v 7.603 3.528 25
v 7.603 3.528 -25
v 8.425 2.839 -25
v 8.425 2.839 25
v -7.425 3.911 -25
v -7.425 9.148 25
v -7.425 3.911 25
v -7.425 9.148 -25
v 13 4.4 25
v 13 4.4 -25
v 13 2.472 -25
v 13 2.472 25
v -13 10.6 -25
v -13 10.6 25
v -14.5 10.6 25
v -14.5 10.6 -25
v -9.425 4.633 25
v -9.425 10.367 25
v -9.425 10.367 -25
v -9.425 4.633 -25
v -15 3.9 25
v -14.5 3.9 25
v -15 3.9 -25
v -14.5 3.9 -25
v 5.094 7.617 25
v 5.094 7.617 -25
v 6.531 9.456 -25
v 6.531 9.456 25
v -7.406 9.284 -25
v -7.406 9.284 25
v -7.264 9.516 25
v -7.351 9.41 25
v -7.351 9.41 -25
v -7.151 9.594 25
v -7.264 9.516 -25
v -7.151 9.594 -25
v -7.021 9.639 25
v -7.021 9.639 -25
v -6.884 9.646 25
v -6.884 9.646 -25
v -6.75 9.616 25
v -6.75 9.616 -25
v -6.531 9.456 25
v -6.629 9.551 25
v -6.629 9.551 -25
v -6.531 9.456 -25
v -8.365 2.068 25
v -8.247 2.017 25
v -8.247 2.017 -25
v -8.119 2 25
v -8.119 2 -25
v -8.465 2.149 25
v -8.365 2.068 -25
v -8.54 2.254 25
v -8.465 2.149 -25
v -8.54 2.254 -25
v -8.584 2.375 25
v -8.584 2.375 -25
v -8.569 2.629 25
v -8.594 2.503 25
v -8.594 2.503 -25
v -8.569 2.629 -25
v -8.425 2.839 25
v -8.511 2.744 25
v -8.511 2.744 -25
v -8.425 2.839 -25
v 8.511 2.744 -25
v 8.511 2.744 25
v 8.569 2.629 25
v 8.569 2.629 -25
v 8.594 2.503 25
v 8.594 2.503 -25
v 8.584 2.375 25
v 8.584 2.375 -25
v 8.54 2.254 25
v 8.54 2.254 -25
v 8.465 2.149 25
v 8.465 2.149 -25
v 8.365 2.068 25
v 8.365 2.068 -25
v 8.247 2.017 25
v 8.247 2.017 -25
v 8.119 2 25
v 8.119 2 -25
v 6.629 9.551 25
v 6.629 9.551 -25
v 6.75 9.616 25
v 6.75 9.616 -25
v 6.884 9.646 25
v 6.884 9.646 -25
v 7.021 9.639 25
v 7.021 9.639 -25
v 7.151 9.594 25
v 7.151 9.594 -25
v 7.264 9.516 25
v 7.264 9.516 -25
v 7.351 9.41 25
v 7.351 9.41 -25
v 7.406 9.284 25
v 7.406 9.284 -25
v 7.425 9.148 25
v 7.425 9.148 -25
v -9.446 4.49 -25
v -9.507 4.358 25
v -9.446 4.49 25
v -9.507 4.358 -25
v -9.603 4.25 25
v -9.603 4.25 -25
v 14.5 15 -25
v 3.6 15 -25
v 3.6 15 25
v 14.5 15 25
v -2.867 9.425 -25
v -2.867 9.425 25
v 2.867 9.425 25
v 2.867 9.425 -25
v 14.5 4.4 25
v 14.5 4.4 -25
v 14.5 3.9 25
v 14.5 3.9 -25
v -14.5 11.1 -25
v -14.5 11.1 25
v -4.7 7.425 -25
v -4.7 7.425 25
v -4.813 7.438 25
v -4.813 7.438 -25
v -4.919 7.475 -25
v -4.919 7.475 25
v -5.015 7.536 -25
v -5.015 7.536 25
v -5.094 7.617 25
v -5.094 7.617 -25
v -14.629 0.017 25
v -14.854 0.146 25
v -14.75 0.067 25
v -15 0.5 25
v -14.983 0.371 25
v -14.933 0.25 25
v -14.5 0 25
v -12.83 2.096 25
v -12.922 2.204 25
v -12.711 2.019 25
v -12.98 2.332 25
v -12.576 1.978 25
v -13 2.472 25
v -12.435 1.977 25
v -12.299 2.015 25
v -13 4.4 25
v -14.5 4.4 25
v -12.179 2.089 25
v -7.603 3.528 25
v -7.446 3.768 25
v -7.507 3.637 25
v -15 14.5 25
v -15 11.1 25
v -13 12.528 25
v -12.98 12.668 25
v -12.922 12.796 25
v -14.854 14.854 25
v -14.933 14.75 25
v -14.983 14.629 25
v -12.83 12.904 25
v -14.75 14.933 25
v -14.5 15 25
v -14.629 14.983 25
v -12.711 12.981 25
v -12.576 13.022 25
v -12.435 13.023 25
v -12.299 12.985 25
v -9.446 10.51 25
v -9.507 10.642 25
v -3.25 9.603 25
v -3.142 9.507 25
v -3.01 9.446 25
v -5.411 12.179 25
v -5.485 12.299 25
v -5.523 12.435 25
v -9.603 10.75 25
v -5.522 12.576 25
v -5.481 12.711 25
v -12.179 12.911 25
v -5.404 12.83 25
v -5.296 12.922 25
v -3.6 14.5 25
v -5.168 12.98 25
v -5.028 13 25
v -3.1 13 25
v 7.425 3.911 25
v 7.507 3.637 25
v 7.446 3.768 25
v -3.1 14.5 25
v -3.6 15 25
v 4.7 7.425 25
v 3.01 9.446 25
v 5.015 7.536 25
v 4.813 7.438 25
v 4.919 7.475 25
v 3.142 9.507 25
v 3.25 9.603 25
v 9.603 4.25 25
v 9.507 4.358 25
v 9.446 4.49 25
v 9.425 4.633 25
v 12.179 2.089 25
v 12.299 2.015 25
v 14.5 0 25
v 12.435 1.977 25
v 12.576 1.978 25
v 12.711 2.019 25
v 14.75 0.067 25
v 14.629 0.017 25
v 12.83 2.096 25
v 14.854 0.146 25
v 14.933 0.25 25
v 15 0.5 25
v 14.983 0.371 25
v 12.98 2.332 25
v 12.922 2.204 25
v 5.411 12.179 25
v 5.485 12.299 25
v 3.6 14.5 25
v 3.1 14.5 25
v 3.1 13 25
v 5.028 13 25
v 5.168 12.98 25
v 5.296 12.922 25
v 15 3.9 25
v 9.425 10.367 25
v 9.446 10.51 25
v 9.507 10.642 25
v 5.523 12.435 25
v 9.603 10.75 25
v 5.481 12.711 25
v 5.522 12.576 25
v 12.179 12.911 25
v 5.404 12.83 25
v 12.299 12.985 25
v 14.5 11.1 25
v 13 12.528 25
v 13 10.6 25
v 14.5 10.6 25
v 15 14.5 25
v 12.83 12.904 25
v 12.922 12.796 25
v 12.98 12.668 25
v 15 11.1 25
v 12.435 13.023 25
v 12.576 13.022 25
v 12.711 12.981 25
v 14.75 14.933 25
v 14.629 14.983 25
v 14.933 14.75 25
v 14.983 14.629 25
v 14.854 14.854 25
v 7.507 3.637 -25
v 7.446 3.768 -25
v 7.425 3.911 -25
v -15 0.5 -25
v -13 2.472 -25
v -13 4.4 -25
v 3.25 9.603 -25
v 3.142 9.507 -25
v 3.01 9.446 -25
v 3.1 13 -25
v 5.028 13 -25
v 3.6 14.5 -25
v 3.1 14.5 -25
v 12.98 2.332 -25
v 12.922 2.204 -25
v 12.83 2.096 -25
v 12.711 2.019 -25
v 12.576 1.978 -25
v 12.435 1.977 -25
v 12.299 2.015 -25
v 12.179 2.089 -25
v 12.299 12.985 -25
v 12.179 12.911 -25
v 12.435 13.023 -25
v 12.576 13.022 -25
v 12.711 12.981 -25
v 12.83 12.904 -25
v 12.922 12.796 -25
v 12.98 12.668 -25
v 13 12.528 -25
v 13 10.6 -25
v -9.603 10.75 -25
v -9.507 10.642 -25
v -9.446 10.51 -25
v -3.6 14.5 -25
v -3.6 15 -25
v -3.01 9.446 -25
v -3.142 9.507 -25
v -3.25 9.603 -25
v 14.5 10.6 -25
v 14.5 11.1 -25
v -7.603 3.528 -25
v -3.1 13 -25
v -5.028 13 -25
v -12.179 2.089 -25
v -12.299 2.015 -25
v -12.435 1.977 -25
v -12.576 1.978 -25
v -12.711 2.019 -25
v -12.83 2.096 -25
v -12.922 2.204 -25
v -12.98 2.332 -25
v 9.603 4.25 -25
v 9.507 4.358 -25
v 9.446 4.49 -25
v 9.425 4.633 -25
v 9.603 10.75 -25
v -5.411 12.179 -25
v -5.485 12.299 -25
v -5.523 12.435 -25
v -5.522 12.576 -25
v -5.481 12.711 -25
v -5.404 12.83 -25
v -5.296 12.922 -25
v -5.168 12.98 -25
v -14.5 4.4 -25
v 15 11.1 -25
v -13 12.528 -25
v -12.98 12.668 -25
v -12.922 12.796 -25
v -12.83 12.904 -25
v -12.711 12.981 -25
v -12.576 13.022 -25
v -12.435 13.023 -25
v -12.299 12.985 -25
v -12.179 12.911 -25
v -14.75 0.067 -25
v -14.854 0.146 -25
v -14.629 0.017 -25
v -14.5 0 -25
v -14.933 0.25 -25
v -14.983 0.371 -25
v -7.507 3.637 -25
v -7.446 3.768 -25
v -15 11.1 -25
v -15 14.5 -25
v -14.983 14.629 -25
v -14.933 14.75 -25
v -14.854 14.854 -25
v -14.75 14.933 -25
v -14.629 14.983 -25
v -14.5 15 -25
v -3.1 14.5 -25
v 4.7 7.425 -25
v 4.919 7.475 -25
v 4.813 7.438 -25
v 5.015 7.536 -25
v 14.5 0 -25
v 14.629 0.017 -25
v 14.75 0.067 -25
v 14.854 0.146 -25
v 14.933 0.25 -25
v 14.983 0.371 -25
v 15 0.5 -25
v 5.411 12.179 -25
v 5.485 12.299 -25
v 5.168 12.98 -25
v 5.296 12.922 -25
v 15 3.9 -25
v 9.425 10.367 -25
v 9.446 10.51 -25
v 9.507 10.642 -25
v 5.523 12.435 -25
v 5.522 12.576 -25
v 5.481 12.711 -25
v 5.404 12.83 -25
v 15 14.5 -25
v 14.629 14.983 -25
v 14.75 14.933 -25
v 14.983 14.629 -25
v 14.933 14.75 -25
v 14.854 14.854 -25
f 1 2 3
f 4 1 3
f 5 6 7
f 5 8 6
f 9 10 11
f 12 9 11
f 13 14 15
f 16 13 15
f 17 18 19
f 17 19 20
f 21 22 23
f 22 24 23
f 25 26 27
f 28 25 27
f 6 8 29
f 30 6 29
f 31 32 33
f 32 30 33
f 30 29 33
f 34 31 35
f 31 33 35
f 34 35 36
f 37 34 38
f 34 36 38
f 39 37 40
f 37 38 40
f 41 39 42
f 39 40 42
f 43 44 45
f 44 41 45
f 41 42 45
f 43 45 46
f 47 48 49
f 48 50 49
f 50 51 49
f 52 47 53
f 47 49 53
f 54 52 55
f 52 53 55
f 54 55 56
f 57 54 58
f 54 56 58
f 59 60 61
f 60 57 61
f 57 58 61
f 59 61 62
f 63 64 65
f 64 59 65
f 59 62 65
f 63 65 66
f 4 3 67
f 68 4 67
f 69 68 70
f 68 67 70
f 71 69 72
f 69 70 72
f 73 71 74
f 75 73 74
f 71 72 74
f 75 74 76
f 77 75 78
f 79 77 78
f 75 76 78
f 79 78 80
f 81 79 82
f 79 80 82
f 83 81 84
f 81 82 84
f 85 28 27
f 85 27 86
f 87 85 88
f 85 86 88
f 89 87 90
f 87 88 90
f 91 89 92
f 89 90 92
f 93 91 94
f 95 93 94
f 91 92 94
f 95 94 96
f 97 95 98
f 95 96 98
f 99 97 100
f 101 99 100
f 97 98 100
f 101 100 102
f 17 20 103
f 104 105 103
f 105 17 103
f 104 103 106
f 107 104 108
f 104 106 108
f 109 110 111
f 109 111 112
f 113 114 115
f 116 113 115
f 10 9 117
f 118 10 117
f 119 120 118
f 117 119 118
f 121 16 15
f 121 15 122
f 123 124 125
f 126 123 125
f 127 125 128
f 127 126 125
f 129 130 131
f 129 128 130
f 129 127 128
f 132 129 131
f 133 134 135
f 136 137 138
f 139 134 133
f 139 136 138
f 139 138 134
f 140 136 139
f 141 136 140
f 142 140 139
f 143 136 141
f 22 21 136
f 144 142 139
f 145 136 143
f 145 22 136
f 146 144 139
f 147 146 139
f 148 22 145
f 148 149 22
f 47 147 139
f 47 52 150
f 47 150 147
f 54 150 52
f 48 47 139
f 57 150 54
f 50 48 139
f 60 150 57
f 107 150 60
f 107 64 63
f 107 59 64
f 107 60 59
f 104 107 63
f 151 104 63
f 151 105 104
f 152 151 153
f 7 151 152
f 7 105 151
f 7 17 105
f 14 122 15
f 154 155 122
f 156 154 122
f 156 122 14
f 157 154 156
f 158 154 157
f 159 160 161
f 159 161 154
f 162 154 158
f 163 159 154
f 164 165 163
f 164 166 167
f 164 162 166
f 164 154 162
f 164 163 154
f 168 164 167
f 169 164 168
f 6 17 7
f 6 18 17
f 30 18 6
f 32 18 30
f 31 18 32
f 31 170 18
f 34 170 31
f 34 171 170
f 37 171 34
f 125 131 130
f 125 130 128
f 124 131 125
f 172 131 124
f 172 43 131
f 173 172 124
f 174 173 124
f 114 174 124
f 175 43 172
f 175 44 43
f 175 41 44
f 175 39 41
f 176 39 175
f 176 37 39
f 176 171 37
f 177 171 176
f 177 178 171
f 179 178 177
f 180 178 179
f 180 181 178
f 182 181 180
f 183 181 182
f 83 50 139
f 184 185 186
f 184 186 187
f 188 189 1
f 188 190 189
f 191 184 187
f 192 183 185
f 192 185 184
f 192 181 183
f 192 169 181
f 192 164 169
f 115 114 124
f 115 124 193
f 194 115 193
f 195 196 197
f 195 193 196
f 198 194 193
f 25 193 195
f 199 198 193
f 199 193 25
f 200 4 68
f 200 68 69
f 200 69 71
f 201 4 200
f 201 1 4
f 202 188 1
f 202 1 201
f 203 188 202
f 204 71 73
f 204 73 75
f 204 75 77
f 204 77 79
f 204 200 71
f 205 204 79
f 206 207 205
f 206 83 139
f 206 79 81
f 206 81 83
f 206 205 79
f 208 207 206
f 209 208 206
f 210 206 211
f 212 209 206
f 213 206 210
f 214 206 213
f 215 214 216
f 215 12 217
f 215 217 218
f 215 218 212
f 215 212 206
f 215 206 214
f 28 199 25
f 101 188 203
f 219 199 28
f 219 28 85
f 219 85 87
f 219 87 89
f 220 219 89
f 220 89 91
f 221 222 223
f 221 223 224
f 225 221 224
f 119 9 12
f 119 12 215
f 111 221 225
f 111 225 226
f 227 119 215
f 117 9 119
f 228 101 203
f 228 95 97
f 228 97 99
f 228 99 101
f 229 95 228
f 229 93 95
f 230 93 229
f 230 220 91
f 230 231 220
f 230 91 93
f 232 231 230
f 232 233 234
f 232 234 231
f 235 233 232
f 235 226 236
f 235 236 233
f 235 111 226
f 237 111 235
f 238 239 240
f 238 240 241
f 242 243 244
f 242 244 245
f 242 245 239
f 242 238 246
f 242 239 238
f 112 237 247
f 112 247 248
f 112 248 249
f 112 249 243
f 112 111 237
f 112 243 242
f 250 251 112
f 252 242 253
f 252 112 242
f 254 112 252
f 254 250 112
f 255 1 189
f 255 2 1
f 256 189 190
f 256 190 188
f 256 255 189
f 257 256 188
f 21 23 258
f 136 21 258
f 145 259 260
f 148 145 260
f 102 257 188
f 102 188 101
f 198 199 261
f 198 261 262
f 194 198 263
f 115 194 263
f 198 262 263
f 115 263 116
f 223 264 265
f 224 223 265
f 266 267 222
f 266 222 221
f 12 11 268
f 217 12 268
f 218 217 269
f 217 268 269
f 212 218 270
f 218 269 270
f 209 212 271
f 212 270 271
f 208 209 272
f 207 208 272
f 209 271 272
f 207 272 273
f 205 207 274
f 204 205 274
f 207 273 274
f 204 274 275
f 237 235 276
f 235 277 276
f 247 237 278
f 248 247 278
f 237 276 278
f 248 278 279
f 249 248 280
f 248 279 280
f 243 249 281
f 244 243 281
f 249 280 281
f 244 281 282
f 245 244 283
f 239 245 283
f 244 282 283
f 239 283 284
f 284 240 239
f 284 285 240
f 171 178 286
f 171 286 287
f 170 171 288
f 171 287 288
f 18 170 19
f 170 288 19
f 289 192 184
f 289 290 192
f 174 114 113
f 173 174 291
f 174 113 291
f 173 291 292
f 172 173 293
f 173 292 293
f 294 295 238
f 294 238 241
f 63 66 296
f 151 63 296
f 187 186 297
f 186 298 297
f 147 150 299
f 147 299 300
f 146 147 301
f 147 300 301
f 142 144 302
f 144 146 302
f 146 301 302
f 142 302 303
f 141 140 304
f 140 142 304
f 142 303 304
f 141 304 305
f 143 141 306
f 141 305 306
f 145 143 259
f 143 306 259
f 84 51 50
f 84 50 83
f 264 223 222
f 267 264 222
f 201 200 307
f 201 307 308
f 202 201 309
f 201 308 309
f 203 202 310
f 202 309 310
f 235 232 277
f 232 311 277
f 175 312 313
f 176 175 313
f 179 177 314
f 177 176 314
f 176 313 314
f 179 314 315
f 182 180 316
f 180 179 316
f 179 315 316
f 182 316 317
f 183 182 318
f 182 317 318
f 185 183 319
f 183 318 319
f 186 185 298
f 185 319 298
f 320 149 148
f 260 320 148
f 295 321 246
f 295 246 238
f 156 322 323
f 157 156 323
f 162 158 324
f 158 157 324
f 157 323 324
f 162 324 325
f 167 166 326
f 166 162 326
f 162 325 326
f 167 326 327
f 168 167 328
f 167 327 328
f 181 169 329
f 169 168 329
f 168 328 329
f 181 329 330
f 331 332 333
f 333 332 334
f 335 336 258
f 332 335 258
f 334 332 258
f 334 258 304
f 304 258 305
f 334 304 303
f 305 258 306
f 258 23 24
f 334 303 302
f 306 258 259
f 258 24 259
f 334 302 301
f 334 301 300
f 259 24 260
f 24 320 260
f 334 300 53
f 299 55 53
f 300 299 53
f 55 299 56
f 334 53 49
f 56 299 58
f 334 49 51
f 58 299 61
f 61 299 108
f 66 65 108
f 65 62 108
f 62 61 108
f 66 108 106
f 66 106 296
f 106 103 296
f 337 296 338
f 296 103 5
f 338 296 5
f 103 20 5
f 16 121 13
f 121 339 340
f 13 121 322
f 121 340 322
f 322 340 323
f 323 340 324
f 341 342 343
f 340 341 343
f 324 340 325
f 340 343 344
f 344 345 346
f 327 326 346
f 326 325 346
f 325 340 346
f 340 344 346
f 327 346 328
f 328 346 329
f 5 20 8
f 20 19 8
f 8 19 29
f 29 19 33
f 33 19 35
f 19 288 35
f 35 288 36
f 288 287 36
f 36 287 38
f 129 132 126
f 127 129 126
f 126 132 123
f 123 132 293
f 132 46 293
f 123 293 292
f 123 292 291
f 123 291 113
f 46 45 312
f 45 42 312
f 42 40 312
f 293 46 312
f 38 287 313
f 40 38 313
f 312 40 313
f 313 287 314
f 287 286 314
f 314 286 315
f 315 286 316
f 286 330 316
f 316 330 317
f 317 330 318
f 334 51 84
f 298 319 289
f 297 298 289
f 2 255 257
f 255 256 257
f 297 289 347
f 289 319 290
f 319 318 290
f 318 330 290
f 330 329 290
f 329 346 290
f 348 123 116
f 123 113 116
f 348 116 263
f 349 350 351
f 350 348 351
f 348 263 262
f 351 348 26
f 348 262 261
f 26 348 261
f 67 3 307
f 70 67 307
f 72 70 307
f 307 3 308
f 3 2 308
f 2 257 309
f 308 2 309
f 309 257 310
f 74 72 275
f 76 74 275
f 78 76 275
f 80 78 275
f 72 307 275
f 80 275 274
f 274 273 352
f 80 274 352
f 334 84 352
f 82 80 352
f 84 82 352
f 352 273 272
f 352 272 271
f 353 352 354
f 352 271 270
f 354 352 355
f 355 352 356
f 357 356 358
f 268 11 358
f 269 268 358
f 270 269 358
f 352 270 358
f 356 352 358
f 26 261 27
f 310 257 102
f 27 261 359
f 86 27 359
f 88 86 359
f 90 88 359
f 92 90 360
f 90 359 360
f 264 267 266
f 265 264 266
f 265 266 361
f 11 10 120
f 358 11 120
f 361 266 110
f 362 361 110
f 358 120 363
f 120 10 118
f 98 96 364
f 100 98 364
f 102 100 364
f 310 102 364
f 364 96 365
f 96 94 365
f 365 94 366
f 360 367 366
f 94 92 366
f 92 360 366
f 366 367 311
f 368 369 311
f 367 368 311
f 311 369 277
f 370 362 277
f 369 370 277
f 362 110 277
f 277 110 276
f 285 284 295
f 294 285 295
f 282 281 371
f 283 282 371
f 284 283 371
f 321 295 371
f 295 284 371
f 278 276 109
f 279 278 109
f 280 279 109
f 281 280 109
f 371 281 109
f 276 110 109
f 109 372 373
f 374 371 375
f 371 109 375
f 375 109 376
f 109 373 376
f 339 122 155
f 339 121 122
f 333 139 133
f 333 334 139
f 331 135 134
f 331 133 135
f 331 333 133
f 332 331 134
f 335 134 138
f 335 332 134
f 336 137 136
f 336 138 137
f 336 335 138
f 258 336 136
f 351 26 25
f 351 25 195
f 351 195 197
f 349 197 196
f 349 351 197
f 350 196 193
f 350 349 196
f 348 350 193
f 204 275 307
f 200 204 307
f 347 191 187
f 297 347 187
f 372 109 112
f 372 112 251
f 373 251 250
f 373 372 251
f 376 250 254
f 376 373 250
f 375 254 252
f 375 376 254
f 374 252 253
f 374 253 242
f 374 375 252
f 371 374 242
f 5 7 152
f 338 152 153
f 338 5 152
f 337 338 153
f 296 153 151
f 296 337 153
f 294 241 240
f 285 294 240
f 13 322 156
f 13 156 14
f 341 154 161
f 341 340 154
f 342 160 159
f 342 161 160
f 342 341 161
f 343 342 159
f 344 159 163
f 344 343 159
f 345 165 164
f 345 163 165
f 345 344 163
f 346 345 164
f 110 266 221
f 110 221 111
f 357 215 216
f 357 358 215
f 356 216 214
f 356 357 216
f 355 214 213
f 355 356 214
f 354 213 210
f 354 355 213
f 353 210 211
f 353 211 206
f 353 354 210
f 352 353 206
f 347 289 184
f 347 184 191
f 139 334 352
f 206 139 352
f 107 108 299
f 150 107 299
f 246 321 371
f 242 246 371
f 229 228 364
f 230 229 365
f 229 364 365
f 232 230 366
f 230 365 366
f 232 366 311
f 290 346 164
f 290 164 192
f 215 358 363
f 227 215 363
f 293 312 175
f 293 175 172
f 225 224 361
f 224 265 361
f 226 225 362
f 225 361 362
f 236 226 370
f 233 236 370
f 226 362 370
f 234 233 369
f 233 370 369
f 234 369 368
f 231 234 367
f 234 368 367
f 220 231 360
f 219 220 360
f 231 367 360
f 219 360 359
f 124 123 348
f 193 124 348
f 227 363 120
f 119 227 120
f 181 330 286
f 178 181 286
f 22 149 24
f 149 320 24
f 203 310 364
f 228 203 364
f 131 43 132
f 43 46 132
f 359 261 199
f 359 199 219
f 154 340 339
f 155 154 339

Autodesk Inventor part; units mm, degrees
ref_plane "YZ Plane" through (0, 0, 0) normal (1, 0, 0) x (0, 1, 0)
ref_plane "XZ Plane" through (0, 0, 0) normal (0, 1, 0) x (-1, 0, 0)
ref_plane "XY Plane" through (0, 0, 0) normal (0, 0, 1) x (1, 0, 0)
sketch "Esboço1" plane through (0, 0, 0) normal (0, 0, 1) x (1, 0, 0)
  line L0 (-15, 15) -> (15, 15) construction
  line L1 (-15, 15) -> (-15, 10.6) construction
  line L2 (-15, 10.6) -> (-13, 10.6) construction
  line L3 (-13, 13.6) -> (-13, 10.6) construction
  line L4 (-13, 13.6) -> (-9.4247, 10.6) construction
  line L5 (-9.4247, 10.6) -> (-9.4247, 4.4) construction
  line L6 (-9.4247, 4.4) -> (-13, 1.4) construction
  line L7 (-13, 4.4) -> (-13, 1.4) construction
  line L8 (-15, 4.4) -> (-13, 4.4) construction
  line L9 (-15, 4.4) -> (-15, 0) construction
  line L10 (-15, 0) -> (0, 0) construction
  line L11 (-15, 4.4) -> (-14.5, 4.4) construction
  line L12 (-14.5, 4.4) -> (-14.5, 3.9)
  line L13 (-14.5, 3.9) -> (-15, 3.9)
  line L14 (-15, 3.9) -> (-15, 4.4) construction
  line L15 (-15, 10.6) -> (-14.5, 10.6) construction
  line L16 (-14.5, 10.6) -> (-14.5, 11.1)
  line L17 (-14.5, 11.1) -> (-15, 11.1)
  line L18 (-15, 11.1) -> (-15, 10.6) construction
  line L19 (-3.1, 9.4247) -> (3.1, 9.4247) construction
  line L20 (-6.1, 13) -> (-3.1, 9.4247) construction
  line L21 (-6.1, 13) -> (-3.1, 13) construction
  line L22 (-3.1, 15) -> (-3.1, 13) construction
  line L23 (-3.1, 9.4247) -> (0, 9.4247) construction
  line L24 (-3.1, 15) -> (-3.6, 15) construction
  line L25 (-3.6, 15) -> (-3.6, 14.5)
  line L26 (-3.6, 14.5) -> (-3.1, 14.5)
  line L27 (-3.1, 14.5) -> (-3.1, 15) construction
  line L28 (-9.4247, 2) -> (0, 2) construction
  line L29 (-7.4247, 3.6782) -> (-9.4247, 2) construction
  line L30 (-7.4247, 10.6) -> (-7.4247, 3.6782) construction
  line L31 (-7.4247, 10.6) -> (-4.944, 7.4247) construction
  line L32 (-4.944, 7.4247) -> (0, 7.4247) construction
  arc A0 (-14.5, 15) -> (-15, 14.5) centre (-14.5, 14.5) ccw
  arc A1 (-12.1786, 12.9108) -> (-13, 12.5277) centre (-12.5, 12.5277) ccw
  line L33 (-13, 12.5277) -> (-13, 10.6)
  line L34 (-13, 10.6) -> (-14.5, 10.6)
  arc A2 (-9.4247, 10.3668) -> (-9.6033, 10.7499) centre (-9.9247, 10.3668) ccw
  arc A3 (-9.6033, 4.2501) -> (-9.4247, 4.6332) centre (-9.9247, 4.6332) ccw
  arc A4 (-13, 2.4723) -> (-12.1786, 2.0892) centre (-12.5, 2.4723) ccw
  line L35 (-9.6033, 4.2501) -> (-12.1786, 2.0892)
  line L36 (-13, 2.4723) -> (-13, 4.4)
  arc A5 (-15, 0.5) -> (-14.5, 0) centre (-14.5, 0.5) ccw
  line L37 (-15, 14.5) -> (-15, 11.1)
  line L38 (-15, 3.9) -> (-15, 0.5)
  arc A6 (-8.4247, 2.8391) -> (-8.1193, 2) centre (-8.1193, 2.4751) ccw
  arc A7 (-6.5307, 9.4557) -> (-7.4247, 9.1479) centre (-6.9247, 9.1479) ccw
  line L39 (-8.1193, 2) -> (0, 2)
  arc A8 (-7.6033, 3.5283) -> (-7.4247, 3.9114) centre (-7.9247, 3.9114) ccw
  arc A9 (-5.0941, 7.6169) -> (-4.7001, 7.4247) centre (-4.7001, 7.9247) ccw
  arc A10 (-3.2499, 9.6033) -> (-2.8668, 9.4247) centre (-2.8668, 9.9247) ccw
  arc A11 (-5.0277, 13) -> (-5.4108, 12.1786) centre (-5.0277, 12.5) ccw
  line L40 (-5.0277, 13) -> (-3.1, 13)
  line L41 (-2.8668, 9.4247) -> (0, 9.4247)
  line L42 (-4.7001, 7.4247) -> (0, 7.4247)
  line L43 (-6.5307, 9.4557) -> (-5.0941, 7.6169)
  line L44 (-7.4247, 9.1479) -> (-7.4247, 3.9114)
  line L45 (0, 2) -> (0, 0)
  line L46 (0, 7.4247) -> (0, 9.4247)
  line L47 (-3.1, 14.5) -> (-3.1, 13)
  line L48 (-14.5, 4.4) -> (-13, 4.4)
  line L49 (-8.4247, 2.8391) -> (-7.6033, 3.5283)
  line L50 (-14.5, 15) -> (-3.6, 15)
  line L51 (-12.1786, 12.9108) -> (-9.6033, 10.7499)
  line L52 (-9.4247, 10.3668) -> (-9.4247, 4.6332)
  line L53 (-14.5, 0) -> (0, 0)
  line L54 (-5.4108, 12.1786) -> (-3.2499, 9.6033)
  point P0 (0, 15)
  point P1 (-14, 4.4)
  point P2 (-1.55, 9.4247)
  point P3 (-7.25, 0)
  dimension "d0" = 30
  dimension "d1" = 15
  dimension "d6" = 2
  dimension "d7" = 3
  dimension "d9" = 50
  dimension "d12" = 0.5
  dimension "d18" = 50
  dimension "d19" = 2
  dimension "d21" = 2
  dimension "d22" = 2
  dimension "d24" = 2
  dimension "d25" = 0.5
  dimension "d26" = 0.5
  dimension "d27" = 0.5
  dimension "d28" = 0.5
  dimension "d29" = 0.5
  dimension "d30" = 0.5
  dimension "d31" = 0.5
  dimension "d32" = 0.5
  dimension "d33" = 0.5
  dimension "d34" = 0.5
  dimension "d35" = 0.5
  dimension "d38" = 3.1
  dimension "d39" = 6.2
  dimension "d40" = 15
extrude "Extrusão1" add sketch "Esboço1" along normal mid plane 50
mirror "Espelhar1" about plane through (0, 0, 0) normal (1, 0, 0) of "Extrusão1"
equation "\"d6\" = d21"
equation "\"d18\" = d9"
equation "\"d19\" = d21"
equation "\"d22\" = d20"
equation "\"d24\" = d21"
equation "\"d25\" = d35"
equation "\"d26\" = d35"
equation "\"d27\" = d35"
equation "\"d28\" = d35"
equation "\"d29\" = d35"
equation "\"d30\" = d35"
equation "\"d31\" = d35"
equation "\"d32\" = d35"
equation "\"d33\" = d35"
equation "\"d34\" = d35"
equation "\"d39\" = 2 * d38"
equation "\"d20\" = 2deg"
properties part number "perfil_15x30_001" material "Alumínio 6061"
